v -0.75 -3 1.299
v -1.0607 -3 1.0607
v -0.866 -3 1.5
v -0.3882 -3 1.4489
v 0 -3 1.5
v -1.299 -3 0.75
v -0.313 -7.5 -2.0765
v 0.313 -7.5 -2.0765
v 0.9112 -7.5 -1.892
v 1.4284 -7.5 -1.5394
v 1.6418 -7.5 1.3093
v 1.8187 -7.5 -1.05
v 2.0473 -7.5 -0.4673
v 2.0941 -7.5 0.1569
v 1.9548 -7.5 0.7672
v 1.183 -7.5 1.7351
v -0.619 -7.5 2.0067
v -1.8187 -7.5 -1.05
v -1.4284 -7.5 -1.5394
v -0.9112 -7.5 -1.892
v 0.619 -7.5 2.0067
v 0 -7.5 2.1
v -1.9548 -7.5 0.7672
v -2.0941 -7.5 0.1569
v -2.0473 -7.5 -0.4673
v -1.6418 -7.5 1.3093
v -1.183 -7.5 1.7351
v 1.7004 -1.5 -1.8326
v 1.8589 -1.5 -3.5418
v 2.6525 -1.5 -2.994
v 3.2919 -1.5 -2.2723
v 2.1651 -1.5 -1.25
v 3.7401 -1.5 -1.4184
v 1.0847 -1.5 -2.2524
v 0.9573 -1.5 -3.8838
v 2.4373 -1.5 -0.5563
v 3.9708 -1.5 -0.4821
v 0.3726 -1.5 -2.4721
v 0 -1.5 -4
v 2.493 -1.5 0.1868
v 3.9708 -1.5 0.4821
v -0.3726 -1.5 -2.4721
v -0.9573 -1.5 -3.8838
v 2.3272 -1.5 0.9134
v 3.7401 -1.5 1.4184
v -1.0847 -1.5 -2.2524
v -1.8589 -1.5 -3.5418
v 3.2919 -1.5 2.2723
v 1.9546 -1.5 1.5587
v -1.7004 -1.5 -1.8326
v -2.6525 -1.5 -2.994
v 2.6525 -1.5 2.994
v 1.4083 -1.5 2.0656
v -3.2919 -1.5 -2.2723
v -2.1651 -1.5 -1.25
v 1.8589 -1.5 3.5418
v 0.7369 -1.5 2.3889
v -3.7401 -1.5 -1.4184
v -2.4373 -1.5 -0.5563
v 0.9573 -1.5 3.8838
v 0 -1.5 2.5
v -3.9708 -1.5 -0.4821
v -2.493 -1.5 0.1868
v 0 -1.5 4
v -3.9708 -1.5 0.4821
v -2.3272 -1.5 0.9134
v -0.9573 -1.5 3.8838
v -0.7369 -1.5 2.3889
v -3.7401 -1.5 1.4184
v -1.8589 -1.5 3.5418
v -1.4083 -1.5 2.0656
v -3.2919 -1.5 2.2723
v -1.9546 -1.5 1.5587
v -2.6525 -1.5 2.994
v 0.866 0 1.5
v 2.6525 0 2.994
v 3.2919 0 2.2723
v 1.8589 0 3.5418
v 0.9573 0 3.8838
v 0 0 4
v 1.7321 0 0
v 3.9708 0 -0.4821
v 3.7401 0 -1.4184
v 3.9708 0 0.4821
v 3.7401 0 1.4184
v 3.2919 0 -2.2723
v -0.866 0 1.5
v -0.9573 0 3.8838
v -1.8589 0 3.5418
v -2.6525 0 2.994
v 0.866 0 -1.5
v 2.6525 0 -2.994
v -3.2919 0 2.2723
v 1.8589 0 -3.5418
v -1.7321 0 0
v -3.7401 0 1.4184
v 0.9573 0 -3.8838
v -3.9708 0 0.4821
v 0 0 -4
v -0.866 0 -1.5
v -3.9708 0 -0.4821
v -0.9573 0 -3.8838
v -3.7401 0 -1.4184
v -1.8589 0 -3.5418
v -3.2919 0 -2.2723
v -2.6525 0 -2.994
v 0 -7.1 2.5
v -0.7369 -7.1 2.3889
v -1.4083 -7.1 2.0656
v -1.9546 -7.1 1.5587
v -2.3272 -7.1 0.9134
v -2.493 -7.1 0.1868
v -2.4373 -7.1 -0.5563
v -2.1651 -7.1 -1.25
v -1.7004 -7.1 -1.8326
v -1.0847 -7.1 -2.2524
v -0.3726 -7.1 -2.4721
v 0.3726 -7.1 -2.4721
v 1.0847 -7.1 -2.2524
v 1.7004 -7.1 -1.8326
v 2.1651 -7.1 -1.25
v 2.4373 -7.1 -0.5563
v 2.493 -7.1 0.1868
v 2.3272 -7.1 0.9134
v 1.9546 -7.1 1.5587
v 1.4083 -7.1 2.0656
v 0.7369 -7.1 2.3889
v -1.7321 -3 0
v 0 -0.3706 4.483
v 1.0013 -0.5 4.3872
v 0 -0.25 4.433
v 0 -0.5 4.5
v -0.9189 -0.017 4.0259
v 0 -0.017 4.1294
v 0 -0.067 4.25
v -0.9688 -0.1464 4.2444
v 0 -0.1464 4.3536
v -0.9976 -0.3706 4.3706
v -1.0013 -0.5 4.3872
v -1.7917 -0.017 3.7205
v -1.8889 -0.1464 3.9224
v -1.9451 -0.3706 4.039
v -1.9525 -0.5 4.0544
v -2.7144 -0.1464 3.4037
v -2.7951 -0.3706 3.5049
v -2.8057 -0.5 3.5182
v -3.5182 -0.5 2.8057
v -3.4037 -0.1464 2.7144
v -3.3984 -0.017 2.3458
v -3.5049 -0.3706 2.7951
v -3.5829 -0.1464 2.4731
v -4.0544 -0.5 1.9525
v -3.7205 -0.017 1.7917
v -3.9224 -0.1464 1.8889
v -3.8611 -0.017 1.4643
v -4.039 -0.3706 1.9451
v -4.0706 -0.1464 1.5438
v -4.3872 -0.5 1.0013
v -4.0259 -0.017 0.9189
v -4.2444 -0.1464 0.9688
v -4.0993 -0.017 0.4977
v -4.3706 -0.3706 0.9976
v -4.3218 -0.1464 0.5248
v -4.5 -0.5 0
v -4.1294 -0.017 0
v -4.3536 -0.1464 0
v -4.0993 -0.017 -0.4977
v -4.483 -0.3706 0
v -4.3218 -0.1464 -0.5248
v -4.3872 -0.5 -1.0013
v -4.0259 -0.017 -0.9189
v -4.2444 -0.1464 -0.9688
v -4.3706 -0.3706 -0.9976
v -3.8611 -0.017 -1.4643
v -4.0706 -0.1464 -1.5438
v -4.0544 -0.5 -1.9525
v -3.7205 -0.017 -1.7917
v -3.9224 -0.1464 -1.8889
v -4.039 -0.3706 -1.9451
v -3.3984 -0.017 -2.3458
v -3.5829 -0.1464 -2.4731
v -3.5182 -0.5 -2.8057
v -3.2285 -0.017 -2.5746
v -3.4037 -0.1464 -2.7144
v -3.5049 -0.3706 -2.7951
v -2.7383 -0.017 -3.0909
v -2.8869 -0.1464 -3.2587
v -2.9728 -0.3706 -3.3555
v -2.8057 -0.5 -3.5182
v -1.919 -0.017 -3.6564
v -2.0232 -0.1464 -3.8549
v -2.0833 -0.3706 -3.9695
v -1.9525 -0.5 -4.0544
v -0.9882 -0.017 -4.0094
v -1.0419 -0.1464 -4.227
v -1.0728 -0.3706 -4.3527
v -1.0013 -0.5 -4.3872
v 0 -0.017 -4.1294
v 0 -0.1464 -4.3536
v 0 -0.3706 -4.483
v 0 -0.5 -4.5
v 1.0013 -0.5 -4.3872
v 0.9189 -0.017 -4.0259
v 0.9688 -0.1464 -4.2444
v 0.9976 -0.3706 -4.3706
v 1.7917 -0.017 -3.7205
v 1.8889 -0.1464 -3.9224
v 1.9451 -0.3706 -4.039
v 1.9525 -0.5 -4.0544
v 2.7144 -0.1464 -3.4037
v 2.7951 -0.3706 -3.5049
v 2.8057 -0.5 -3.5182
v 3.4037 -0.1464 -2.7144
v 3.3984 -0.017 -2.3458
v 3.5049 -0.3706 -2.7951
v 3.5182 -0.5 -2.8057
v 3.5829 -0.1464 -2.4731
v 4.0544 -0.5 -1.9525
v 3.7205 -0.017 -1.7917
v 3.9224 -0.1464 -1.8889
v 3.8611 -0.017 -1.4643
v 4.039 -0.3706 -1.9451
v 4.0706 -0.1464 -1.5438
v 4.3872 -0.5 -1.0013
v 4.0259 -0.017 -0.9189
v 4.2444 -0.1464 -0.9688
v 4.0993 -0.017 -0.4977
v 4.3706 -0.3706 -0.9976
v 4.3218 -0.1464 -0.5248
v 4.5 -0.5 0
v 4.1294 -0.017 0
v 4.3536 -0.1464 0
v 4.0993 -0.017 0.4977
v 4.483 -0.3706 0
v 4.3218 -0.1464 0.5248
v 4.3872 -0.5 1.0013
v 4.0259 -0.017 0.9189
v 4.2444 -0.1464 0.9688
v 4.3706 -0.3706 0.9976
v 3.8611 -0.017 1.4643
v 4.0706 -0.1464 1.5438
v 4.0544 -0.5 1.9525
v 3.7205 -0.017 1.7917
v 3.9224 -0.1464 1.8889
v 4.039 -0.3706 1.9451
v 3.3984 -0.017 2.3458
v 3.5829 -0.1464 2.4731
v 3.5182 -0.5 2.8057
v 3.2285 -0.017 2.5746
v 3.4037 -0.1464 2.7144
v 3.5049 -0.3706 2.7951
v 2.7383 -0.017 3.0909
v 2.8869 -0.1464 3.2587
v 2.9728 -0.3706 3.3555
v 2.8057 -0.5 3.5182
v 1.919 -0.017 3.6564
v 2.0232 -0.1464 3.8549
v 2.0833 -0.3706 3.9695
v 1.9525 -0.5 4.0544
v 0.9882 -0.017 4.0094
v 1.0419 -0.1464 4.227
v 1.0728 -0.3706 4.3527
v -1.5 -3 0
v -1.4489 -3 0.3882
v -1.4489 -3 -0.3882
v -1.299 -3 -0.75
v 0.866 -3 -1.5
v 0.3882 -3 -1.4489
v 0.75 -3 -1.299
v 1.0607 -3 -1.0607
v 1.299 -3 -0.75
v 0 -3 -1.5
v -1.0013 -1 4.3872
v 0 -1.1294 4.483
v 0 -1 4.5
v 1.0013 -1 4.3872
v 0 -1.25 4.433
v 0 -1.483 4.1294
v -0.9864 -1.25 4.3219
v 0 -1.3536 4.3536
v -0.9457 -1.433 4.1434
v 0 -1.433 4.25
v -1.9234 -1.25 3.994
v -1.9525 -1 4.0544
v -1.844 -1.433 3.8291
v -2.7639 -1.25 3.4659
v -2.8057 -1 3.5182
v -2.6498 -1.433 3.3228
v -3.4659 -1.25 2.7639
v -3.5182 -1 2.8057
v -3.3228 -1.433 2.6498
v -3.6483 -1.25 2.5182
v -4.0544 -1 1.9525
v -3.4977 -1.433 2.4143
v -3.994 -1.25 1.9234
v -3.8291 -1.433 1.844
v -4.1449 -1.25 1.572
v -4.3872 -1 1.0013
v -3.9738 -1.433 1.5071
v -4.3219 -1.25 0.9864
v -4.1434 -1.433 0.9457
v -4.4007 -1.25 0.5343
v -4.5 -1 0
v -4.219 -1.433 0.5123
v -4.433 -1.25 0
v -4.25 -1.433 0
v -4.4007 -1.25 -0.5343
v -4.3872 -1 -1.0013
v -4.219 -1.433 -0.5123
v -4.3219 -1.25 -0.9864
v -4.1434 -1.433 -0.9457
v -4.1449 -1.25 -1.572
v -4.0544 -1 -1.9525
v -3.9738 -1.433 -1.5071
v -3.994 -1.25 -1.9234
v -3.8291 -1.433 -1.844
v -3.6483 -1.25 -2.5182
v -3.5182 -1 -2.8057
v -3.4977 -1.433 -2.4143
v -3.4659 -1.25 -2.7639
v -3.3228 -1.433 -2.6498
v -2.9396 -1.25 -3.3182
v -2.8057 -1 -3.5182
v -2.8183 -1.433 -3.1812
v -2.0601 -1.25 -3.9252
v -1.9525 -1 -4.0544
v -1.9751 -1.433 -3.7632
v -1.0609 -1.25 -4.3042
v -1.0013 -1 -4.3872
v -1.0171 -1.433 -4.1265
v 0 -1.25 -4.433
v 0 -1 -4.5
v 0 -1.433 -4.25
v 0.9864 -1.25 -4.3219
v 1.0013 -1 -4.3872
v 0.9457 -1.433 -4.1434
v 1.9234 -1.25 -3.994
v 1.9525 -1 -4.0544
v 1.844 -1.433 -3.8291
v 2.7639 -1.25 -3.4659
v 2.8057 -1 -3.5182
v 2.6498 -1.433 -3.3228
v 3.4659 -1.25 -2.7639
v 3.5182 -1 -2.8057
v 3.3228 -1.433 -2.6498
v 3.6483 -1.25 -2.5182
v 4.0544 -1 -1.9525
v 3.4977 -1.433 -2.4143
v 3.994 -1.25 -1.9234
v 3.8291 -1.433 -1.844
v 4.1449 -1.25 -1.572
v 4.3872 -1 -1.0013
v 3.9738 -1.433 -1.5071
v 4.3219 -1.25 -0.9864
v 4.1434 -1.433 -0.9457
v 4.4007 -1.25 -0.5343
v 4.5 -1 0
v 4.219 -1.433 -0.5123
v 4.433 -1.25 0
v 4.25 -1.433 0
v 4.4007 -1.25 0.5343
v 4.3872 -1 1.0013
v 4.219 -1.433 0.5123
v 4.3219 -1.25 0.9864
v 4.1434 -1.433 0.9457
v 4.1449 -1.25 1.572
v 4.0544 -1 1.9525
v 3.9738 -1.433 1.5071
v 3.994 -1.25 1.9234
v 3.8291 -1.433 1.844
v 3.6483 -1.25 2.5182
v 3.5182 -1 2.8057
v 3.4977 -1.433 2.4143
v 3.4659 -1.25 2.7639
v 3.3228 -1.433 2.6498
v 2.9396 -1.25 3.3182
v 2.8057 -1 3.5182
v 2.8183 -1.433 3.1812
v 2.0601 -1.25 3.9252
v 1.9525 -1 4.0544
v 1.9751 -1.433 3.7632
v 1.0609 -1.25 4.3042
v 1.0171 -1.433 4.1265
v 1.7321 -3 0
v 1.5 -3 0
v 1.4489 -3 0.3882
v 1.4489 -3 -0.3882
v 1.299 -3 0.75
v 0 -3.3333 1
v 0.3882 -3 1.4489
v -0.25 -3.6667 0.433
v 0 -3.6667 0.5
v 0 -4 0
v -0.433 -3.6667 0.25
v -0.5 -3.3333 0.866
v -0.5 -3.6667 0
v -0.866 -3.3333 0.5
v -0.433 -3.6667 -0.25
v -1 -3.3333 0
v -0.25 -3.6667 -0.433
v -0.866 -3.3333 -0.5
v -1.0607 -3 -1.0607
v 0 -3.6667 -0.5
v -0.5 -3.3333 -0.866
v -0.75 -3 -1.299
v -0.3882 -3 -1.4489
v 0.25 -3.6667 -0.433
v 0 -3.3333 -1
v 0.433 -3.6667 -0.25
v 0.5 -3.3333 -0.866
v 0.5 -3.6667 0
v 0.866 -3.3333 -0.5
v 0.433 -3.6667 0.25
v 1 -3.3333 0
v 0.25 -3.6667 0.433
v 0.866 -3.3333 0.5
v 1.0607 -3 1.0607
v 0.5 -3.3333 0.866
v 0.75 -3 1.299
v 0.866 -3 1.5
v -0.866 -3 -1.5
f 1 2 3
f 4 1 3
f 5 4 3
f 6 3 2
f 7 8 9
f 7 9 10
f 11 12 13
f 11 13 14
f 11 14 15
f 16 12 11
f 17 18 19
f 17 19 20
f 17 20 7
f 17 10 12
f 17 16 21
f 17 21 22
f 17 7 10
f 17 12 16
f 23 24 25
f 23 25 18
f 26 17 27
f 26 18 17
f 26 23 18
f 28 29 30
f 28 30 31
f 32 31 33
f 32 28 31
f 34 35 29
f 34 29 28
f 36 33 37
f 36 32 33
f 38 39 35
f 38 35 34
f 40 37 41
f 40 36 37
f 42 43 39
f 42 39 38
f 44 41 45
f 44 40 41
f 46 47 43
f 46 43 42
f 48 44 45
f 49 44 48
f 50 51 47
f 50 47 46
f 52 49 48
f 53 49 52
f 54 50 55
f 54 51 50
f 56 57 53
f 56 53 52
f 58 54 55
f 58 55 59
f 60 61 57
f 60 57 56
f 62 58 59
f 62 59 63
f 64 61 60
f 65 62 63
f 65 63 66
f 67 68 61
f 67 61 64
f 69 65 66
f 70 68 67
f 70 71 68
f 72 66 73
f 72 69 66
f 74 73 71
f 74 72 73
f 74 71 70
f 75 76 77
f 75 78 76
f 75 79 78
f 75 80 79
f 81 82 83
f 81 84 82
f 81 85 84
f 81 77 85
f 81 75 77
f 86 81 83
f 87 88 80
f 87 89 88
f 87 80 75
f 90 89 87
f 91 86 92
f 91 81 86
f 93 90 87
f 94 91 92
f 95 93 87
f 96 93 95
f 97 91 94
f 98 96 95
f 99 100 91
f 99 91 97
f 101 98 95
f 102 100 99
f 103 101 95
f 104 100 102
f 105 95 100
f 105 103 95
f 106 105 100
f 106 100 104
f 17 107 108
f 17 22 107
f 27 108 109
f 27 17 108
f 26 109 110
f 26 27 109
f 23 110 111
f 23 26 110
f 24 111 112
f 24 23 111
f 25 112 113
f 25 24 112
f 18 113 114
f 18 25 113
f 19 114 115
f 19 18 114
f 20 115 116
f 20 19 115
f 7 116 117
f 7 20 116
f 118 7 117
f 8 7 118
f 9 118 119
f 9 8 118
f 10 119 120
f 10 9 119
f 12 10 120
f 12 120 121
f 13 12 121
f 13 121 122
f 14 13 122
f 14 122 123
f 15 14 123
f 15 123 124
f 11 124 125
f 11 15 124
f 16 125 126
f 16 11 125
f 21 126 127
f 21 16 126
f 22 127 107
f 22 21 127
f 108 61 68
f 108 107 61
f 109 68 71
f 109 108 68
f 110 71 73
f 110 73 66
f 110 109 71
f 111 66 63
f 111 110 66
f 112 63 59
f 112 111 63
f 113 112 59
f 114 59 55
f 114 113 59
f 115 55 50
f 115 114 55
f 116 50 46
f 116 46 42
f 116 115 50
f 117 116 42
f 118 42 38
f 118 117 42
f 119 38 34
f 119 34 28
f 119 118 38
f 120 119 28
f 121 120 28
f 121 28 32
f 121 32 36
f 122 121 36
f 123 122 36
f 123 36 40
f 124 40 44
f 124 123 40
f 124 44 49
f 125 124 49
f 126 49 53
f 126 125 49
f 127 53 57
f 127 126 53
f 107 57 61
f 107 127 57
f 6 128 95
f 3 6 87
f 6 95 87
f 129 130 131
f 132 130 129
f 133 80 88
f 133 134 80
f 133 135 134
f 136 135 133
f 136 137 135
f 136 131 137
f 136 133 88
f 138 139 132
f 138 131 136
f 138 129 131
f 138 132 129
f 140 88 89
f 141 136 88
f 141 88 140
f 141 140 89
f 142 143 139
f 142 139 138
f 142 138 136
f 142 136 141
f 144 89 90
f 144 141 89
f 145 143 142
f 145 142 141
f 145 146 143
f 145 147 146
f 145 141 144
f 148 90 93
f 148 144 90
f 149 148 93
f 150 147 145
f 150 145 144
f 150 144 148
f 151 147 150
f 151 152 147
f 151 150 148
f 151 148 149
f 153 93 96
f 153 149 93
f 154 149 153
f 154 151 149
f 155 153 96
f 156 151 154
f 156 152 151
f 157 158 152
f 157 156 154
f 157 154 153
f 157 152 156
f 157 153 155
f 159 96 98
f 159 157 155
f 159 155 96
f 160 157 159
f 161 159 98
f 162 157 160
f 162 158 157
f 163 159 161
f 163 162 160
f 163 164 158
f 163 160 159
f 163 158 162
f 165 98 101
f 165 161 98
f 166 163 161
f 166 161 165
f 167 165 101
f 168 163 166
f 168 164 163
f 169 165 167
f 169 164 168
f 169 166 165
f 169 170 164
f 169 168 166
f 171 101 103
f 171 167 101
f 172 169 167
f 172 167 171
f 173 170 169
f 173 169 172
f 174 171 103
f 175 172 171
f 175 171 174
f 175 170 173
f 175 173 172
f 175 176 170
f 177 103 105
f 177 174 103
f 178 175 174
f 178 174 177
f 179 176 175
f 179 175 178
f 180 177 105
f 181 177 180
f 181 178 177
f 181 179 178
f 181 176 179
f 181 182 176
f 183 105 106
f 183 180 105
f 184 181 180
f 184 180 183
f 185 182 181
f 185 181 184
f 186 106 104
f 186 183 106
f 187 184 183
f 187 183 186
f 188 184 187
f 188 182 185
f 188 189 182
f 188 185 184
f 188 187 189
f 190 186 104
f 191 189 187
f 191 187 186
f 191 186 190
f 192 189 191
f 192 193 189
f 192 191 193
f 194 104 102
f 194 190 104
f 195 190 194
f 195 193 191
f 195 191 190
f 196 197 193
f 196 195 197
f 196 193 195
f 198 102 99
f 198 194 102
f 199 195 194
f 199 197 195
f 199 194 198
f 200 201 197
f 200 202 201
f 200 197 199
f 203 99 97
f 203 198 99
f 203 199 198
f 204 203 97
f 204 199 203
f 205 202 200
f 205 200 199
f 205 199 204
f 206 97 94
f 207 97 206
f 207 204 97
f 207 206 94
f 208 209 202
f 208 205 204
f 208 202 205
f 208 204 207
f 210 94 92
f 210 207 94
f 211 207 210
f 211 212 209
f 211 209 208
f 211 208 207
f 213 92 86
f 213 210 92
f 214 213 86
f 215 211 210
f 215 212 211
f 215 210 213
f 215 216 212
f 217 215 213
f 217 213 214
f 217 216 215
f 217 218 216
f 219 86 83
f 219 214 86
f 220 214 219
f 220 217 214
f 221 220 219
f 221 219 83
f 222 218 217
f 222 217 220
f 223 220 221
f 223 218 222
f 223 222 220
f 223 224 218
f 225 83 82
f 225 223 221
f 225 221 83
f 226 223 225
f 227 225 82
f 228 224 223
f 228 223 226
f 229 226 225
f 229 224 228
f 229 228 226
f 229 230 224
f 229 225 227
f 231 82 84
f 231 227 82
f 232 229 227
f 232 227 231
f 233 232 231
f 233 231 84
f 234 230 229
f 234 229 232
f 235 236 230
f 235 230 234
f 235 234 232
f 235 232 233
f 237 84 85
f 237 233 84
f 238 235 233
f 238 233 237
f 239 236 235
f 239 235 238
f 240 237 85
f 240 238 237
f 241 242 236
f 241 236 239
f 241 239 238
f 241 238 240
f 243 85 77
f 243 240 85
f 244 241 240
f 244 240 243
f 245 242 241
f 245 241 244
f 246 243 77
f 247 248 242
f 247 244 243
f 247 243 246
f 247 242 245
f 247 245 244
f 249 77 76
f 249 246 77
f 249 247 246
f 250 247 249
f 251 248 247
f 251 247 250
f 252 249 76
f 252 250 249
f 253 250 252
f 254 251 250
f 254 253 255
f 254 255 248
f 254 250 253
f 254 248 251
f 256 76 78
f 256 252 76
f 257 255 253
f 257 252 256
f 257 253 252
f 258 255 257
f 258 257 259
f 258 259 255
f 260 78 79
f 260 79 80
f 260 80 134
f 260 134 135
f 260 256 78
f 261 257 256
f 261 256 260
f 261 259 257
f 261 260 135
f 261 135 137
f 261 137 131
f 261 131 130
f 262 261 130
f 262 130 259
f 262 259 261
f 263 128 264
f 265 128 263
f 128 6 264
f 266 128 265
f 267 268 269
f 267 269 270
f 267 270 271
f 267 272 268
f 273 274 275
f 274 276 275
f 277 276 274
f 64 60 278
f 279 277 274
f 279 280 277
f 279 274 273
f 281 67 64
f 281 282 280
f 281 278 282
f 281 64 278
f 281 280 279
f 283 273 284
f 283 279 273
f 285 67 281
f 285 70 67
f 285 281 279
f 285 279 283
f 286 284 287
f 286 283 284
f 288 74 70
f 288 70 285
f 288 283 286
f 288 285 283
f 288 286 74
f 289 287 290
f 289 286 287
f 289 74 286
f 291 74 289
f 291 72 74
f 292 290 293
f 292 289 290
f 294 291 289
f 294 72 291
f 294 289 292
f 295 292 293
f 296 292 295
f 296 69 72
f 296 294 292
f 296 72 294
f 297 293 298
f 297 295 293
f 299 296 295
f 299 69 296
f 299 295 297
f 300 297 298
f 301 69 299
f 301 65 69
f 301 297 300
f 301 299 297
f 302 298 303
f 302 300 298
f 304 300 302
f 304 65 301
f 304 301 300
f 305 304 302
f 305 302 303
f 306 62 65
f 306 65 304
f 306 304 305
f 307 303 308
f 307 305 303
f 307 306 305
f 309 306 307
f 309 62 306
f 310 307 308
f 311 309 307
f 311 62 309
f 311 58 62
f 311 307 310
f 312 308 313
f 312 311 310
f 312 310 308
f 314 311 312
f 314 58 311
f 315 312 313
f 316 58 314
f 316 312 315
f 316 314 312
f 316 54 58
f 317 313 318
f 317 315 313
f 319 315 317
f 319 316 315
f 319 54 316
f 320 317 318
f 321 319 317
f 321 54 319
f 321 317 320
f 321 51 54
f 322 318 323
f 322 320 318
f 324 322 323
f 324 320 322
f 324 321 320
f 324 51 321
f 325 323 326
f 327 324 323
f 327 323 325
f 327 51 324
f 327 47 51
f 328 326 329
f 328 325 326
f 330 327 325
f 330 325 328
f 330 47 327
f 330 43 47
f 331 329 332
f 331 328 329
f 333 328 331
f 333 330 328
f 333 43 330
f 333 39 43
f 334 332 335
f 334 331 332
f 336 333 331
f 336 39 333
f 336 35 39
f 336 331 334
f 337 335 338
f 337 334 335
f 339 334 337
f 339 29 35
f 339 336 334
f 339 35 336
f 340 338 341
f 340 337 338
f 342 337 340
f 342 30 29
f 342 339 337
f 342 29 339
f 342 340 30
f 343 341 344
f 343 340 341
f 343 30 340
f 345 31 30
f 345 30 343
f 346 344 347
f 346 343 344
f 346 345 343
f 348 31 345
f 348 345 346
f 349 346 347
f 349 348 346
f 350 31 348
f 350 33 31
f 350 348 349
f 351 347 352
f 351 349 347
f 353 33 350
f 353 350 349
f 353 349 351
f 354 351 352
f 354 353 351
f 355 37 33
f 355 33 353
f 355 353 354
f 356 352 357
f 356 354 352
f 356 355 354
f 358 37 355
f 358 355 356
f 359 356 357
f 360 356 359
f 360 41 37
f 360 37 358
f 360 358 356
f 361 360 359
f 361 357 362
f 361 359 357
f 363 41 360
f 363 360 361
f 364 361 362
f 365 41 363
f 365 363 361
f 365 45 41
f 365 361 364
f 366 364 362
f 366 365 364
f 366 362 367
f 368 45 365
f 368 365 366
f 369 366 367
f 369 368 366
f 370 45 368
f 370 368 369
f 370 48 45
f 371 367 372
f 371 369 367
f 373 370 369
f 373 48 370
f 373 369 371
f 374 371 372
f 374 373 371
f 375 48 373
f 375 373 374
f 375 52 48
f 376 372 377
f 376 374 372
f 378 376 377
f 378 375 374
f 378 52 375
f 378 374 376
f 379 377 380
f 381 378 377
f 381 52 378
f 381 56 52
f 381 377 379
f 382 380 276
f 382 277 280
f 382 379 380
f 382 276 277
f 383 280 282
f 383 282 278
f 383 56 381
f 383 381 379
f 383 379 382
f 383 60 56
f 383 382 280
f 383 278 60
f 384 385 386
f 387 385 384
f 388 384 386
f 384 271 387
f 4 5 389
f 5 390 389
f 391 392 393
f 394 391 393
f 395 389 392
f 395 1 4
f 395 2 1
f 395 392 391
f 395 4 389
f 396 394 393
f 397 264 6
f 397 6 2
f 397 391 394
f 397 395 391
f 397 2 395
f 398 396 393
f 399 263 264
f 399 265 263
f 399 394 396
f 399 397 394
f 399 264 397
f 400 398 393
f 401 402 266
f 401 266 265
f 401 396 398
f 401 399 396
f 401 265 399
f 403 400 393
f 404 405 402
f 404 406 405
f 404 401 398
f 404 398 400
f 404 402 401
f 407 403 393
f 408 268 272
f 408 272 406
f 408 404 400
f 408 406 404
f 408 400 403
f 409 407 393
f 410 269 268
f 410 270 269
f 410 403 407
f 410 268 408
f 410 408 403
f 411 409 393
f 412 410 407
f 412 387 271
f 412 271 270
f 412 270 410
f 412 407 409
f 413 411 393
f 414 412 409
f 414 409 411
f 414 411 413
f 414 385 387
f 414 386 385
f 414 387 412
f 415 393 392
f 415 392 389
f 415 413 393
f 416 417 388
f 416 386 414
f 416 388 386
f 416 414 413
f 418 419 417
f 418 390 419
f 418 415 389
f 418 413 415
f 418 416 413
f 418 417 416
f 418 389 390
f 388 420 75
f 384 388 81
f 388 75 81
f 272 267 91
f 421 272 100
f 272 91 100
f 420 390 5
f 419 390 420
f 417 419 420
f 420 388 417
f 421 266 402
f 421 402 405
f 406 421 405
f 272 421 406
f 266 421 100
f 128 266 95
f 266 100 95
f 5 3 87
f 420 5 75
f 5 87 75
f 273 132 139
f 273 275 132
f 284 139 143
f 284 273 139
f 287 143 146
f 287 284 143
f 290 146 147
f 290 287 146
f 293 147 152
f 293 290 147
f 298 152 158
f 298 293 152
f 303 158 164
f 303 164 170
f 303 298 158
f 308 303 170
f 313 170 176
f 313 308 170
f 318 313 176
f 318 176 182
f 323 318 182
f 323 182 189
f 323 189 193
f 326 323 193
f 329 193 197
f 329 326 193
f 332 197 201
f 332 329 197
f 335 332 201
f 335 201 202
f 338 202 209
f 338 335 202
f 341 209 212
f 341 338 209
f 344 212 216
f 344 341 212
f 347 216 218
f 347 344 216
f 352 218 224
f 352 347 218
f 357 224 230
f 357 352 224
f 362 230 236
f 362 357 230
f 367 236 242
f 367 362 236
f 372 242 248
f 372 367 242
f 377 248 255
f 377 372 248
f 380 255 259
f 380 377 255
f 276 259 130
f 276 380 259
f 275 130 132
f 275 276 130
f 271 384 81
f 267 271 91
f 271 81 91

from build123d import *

# Parameters (mm, degrees)
CUT_EXTRUDE2_DEPTH = 3


with BuildPart() as part:
    # Sketch1 → Revolve1 (revolve)
    with BuildSketch(Plane.XY, mode=Mode.PRIVATE) as revolve1_sk:
        with BuildLine():
            Line((-4.5, -0.5), (-4.5, -1))
            ThreePointArc((-4.5, -1), (-4.353553391, -1.353553391), (-4, -1.5))
            Line((-4, -1.5), (-2.5, -1.5))
            Line((-2.5, -1.5), (-2.5, -7.1))
            Line((-2.5, -7.1), (-2.1, -7.5))
            Line((-2.1, -7.5), (0, -7.5))
            Line((0, -7.5), (0, -4))
            Line((0, -4), (-1.5, -3))
            Line((-1.5, -3), (-1.5, 0))
            Line((-1.5, 0), (-4, 0))
            ThreePointArc((-4, 0), (-4.353553391, -0.146446609), (-4.5, -0.5))
        make_face()
    revolve(revolve1_sk.sketch.rotate(Axis((0, 2.75, 0), (0, -1, 0)), 270), axis=Axis((0, 2.75, 0), (0, -1, 0)))

    # Sketch3 → Cut-Extrude2 (cut)
    with BuildSketch(Plane(origin=(0, 0, 0), x_dir=(1, 0, 0), z_dir=(0, 1, 0))):
        Polygon((-0.866025404, -1.5), (0.866025404, -1.5), (1.732050808, 0), (0.866025404, 1.5), (-0.866025404, 1.5), (-1.732050808, 0), align=None)
    extrude(amount=-CUT_EXTRUDE2_DEPTH, mode=Mode.SUBTRACT)


solid = part.part
